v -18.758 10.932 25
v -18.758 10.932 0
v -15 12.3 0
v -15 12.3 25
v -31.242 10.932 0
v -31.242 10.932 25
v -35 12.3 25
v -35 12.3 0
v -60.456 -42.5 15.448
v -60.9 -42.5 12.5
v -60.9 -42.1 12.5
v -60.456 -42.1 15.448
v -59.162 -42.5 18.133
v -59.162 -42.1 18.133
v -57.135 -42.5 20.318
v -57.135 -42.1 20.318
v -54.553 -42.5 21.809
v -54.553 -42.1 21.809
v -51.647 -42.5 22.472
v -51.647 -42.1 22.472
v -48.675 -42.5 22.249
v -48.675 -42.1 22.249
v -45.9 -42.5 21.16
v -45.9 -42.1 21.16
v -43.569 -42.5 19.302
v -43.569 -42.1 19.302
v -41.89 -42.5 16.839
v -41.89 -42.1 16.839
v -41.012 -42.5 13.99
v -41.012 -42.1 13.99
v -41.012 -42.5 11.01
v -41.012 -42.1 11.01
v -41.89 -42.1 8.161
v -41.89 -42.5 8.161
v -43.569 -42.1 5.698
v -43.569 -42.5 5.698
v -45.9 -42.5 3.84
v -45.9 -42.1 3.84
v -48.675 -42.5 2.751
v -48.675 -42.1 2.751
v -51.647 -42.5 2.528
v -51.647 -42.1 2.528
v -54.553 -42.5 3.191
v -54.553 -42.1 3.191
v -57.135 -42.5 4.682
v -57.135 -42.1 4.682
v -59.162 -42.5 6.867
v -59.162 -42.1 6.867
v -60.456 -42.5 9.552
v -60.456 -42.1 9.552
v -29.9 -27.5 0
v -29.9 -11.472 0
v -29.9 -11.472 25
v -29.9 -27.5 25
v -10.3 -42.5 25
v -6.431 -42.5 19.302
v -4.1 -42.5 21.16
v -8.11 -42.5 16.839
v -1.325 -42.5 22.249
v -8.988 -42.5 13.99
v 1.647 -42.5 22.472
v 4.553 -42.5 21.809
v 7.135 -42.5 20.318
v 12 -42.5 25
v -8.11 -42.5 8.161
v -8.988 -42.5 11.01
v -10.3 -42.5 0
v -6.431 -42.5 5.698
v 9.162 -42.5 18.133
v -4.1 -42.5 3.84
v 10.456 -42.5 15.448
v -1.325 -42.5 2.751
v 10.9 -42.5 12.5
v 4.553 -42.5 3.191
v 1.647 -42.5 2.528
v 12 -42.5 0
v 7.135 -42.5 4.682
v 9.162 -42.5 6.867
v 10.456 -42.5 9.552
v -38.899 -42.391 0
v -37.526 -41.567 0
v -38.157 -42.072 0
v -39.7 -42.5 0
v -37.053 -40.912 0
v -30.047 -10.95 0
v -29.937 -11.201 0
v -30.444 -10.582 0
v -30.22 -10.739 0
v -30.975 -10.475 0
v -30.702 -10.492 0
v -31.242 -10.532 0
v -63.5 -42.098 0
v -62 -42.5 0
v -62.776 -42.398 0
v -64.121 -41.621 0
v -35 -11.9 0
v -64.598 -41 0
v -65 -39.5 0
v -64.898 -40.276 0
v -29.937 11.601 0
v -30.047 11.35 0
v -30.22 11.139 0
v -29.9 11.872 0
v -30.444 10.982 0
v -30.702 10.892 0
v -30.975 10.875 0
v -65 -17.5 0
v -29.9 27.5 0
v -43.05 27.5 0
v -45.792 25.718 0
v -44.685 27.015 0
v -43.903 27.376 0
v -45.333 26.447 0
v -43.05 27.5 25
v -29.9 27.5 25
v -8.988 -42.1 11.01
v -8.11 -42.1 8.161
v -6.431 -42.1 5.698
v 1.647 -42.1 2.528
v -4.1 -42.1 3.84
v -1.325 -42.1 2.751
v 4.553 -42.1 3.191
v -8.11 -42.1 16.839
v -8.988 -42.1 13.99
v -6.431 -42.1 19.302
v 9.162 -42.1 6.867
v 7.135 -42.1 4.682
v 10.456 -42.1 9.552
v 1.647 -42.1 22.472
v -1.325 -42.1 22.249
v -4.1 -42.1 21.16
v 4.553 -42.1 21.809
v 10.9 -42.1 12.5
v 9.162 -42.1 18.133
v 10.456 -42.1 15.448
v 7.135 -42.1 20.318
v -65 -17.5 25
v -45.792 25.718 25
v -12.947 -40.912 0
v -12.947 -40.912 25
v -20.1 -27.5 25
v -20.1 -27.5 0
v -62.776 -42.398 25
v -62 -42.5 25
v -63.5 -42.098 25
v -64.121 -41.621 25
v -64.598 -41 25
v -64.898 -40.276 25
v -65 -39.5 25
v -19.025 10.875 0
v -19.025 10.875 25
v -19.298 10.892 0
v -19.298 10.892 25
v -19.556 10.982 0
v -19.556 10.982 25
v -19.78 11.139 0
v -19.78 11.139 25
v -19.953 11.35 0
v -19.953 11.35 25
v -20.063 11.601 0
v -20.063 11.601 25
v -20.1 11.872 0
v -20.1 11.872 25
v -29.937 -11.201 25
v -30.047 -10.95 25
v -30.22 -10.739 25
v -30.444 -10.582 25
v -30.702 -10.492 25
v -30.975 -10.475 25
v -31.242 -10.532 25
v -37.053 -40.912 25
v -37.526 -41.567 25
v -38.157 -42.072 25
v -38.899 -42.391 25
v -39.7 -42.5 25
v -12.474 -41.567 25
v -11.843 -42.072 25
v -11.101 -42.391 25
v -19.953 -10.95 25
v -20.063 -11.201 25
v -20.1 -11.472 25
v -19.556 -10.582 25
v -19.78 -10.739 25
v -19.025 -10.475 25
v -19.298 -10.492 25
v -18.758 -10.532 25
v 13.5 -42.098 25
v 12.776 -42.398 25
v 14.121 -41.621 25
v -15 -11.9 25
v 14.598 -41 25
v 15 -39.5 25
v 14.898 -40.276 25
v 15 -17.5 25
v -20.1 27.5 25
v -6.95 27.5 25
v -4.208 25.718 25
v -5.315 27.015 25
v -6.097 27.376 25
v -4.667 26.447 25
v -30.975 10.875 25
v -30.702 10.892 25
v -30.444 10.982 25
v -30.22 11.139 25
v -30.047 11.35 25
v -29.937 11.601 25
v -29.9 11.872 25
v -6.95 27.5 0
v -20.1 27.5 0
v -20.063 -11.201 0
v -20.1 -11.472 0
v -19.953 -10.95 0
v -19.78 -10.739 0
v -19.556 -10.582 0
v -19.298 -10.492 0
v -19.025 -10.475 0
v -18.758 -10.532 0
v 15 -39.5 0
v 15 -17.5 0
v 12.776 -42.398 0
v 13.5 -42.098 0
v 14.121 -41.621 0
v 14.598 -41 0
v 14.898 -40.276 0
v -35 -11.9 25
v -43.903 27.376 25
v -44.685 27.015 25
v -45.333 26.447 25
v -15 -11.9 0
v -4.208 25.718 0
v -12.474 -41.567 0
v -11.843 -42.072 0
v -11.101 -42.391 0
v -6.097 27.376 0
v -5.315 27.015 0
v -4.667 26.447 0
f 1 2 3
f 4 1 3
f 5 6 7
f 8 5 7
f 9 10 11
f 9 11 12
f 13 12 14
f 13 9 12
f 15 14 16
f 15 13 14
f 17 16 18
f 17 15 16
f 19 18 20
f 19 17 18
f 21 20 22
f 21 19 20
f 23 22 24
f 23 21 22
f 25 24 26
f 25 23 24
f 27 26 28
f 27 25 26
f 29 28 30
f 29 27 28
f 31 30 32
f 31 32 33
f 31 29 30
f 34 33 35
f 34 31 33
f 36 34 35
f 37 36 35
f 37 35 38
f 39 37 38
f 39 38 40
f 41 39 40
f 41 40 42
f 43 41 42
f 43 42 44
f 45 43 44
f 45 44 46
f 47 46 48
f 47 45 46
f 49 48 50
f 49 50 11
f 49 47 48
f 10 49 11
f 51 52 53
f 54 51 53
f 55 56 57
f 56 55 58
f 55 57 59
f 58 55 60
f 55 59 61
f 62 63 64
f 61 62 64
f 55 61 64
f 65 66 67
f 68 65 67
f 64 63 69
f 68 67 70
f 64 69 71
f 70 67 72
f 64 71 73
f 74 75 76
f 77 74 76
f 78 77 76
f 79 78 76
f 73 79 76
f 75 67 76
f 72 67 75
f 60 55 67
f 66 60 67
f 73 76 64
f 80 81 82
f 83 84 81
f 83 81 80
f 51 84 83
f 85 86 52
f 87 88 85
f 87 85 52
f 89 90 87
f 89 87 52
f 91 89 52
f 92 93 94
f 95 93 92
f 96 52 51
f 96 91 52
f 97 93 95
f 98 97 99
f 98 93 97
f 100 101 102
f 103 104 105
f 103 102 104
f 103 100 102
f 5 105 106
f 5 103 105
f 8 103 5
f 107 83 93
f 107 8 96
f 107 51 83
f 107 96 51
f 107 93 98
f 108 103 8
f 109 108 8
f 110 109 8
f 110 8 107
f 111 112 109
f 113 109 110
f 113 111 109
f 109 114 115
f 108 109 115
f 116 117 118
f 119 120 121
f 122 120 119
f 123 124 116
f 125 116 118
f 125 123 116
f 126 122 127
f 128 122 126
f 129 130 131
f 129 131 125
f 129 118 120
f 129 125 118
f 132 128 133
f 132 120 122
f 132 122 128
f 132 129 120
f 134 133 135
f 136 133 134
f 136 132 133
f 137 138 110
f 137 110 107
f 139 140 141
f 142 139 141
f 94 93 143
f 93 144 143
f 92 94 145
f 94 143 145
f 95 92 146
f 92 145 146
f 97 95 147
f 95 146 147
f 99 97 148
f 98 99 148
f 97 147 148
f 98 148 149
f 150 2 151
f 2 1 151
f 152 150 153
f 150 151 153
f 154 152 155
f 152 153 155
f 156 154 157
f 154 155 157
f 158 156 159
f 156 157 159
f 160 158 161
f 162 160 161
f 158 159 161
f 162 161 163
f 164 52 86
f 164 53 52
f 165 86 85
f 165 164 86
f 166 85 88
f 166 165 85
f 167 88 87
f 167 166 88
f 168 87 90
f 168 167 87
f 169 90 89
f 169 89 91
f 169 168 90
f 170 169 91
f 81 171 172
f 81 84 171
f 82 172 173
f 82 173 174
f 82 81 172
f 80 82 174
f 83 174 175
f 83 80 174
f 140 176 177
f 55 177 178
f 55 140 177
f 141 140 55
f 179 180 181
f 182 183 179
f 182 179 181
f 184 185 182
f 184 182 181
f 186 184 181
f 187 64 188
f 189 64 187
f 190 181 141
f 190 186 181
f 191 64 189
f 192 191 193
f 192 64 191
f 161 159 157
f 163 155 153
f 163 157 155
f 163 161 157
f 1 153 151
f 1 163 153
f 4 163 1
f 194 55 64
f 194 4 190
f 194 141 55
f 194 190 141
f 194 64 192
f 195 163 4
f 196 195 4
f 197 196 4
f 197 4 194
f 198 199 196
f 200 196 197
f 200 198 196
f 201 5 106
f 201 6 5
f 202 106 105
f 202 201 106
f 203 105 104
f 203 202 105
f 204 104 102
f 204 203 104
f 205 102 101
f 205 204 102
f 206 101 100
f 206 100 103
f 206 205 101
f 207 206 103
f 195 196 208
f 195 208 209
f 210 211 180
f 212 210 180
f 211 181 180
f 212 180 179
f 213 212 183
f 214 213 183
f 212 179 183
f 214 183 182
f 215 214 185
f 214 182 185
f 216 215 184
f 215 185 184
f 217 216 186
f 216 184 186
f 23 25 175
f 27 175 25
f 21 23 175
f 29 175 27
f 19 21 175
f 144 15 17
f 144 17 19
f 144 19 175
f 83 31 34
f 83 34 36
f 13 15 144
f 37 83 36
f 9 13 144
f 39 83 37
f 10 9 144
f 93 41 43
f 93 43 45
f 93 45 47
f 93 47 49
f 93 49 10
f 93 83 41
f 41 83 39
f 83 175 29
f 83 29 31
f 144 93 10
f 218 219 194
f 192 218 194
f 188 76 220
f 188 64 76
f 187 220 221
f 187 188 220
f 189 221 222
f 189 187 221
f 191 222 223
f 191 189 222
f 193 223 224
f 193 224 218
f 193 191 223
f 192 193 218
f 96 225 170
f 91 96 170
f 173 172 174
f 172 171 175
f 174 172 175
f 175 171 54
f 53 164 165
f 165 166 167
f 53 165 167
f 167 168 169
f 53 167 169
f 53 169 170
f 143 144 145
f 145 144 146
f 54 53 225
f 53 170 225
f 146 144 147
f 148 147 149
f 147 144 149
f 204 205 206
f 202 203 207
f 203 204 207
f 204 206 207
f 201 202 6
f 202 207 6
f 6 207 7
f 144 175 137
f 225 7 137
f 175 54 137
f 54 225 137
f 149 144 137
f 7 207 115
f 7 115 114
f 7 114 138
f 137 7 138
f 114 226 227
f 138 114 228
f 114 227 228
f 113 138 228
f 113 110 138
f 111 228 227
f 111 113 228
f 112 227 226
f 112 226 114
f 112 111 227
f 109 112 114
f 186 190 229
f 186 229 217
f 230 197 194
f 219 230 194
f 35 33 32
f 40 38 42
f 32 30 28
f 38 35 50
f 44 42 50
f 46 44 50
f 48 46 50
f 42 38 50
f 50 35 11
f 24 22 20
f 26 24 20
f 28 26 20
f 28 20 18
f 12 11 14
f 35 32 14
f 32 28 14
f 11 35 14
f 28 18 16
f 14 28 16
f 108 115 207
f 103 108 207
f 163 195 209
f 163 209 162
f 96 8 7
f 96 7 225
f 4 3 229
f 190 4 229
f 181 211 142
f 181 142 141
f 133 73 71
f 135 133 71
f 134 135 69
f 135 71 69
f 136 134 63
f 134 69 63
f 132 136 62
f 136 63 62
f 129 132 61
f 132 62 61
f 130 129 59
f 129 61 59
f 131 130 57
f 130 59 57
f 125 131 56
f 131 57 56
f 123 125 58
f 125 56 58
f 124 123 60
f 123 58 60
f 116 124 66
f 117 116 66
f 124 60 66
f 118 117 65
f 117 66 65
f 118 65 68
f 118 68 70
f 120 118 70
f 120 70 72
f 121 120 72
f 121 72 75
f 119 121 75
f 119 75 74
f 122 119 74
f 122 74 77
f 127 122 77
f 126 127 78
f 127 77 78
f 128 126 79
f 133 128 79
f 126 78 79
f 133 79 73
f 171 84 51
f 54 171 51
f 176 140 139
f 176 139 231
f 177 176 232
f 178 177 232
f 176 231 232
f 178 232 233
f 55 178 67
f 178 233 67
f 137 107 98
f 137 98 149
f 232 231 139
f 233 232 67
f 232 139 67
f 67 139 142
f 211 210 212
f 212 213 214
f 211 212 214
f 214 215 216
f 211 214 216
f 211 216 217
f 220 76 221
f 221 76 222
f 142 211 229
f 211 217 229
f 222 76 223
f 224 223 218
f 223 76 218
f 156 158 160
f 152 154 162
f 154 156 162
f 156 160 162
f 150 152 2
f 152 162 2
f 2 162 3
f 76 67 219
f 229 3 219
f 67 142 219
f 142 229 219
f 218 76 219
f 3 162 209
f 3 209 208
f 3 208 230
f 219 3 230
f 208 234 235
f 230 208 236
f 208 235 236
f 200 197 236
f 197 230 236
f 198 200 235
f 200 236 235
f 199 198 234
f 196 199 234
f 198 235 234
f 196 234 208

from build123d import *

# Parameters (mm, degrees)
F1_DEPTH = 25
F2_DEPTH = 15
F3_R     = 10
F4_DEPTH = 0.4
F6_DEPTH = 25
F9_R     = 1
F9_2_R   = 1
F10_R    = 3
F10_2_R  = 3


with BuildPart() as f1:
    # F0 (on Top) → F1 (new body)
    with BuildSketch(Plane.XY):
        Polygon((15, 27.5), (-15, 27.5), (-15, 12.3), (-15, -11.9), (-15, -27.5), (15, -27.5), align=None)
        Polygon((-15, 12.3), (-15, 27.5), (-20.1, 27.5), (-20.1, 10.4437518052), align=None)
        Polygon((-15, -27.5), (-15, -11.9), (-20.1, -10.0437518052), (-20.1, -27.5), align=None)
    extrude(amount=F1_DEPTH)

    # F2 (add): a face of the model
    f2_faces = [f1.faces().sort_by_distance(p)[0] for p in [
        (-2.55, -27.5, 12.5),
    ]]
    extrude(f2_faces, amount=F2_DEPTH)

    # F3 (on face) → F4 (cut)
    with BuildSketch(Plane.XZ.offset(42.5)):
        with Locations((0.9, 12.5)):
            Circle(F3_R)
    extrude(amount=-F4_DEPTH, mode=Mode.SUBTRACT)

    # F5 (on face) → F6 (cut)
    with BuildSketch(Plane.XY.offset(25)):
        Polygon((15, -17.5), (15, 27.5), (-5, 27.5), align=None)
        Polygon((-20.1, -27.5), (-20.1, -42.5), (-12.1, -42.5), align=None)
    extrude(amount=-F6_DEPTH, mode=Mode.SUBTRACT)


with BuildPart() as f8_1:
    # F8: instance of F1
    add(f1.part.mirror(Plane.YZ.offset(-25)))

    # F9
    f9_edges = [f8_1.edges().sort_by_distance(p)[0] for p in [
        (-29.9, 10.443752, 12.5),
        (-29.9, -10.043752, 12.5),
    ]]
    fillet(f9_edges, radius=F9_R)

    # F10
    f10_edges = [f8_1.edges().sort_by_distance(p)[0] for p in [
        (-65, -42.5, 12.5),
        (-45, 27.5, 12.5),
        (-37.9, -42.5, 12.5),
    ]]
    fillet(f10_edges, radius=F10_R)


with BuildPart() as f1_1:
    add(f1.part)

    # F9#2
    f9_2_edges = [f1_1.edges().sort_by_distance(p)[0] for p in [
        (-20.1, 10.443752, 12.5),
        (-20.1, -10.043752, 12.5),
    ]]
    fillet(f9_2_edges, radius=F9_2_R)

    # F10#2
    f10_2_edges = [f1_1.edges().sort_by_distance(p)[0] for p in [
        (15, -42.5, 12.5),
        (-5, 27.5, 12.5),
        (-12.1, -42.5, 12.5),
    ]]
    fillet(f10_2_edges, radius=F10_2_R)


solid = Compound([f8_1.part, f1_1.part])
